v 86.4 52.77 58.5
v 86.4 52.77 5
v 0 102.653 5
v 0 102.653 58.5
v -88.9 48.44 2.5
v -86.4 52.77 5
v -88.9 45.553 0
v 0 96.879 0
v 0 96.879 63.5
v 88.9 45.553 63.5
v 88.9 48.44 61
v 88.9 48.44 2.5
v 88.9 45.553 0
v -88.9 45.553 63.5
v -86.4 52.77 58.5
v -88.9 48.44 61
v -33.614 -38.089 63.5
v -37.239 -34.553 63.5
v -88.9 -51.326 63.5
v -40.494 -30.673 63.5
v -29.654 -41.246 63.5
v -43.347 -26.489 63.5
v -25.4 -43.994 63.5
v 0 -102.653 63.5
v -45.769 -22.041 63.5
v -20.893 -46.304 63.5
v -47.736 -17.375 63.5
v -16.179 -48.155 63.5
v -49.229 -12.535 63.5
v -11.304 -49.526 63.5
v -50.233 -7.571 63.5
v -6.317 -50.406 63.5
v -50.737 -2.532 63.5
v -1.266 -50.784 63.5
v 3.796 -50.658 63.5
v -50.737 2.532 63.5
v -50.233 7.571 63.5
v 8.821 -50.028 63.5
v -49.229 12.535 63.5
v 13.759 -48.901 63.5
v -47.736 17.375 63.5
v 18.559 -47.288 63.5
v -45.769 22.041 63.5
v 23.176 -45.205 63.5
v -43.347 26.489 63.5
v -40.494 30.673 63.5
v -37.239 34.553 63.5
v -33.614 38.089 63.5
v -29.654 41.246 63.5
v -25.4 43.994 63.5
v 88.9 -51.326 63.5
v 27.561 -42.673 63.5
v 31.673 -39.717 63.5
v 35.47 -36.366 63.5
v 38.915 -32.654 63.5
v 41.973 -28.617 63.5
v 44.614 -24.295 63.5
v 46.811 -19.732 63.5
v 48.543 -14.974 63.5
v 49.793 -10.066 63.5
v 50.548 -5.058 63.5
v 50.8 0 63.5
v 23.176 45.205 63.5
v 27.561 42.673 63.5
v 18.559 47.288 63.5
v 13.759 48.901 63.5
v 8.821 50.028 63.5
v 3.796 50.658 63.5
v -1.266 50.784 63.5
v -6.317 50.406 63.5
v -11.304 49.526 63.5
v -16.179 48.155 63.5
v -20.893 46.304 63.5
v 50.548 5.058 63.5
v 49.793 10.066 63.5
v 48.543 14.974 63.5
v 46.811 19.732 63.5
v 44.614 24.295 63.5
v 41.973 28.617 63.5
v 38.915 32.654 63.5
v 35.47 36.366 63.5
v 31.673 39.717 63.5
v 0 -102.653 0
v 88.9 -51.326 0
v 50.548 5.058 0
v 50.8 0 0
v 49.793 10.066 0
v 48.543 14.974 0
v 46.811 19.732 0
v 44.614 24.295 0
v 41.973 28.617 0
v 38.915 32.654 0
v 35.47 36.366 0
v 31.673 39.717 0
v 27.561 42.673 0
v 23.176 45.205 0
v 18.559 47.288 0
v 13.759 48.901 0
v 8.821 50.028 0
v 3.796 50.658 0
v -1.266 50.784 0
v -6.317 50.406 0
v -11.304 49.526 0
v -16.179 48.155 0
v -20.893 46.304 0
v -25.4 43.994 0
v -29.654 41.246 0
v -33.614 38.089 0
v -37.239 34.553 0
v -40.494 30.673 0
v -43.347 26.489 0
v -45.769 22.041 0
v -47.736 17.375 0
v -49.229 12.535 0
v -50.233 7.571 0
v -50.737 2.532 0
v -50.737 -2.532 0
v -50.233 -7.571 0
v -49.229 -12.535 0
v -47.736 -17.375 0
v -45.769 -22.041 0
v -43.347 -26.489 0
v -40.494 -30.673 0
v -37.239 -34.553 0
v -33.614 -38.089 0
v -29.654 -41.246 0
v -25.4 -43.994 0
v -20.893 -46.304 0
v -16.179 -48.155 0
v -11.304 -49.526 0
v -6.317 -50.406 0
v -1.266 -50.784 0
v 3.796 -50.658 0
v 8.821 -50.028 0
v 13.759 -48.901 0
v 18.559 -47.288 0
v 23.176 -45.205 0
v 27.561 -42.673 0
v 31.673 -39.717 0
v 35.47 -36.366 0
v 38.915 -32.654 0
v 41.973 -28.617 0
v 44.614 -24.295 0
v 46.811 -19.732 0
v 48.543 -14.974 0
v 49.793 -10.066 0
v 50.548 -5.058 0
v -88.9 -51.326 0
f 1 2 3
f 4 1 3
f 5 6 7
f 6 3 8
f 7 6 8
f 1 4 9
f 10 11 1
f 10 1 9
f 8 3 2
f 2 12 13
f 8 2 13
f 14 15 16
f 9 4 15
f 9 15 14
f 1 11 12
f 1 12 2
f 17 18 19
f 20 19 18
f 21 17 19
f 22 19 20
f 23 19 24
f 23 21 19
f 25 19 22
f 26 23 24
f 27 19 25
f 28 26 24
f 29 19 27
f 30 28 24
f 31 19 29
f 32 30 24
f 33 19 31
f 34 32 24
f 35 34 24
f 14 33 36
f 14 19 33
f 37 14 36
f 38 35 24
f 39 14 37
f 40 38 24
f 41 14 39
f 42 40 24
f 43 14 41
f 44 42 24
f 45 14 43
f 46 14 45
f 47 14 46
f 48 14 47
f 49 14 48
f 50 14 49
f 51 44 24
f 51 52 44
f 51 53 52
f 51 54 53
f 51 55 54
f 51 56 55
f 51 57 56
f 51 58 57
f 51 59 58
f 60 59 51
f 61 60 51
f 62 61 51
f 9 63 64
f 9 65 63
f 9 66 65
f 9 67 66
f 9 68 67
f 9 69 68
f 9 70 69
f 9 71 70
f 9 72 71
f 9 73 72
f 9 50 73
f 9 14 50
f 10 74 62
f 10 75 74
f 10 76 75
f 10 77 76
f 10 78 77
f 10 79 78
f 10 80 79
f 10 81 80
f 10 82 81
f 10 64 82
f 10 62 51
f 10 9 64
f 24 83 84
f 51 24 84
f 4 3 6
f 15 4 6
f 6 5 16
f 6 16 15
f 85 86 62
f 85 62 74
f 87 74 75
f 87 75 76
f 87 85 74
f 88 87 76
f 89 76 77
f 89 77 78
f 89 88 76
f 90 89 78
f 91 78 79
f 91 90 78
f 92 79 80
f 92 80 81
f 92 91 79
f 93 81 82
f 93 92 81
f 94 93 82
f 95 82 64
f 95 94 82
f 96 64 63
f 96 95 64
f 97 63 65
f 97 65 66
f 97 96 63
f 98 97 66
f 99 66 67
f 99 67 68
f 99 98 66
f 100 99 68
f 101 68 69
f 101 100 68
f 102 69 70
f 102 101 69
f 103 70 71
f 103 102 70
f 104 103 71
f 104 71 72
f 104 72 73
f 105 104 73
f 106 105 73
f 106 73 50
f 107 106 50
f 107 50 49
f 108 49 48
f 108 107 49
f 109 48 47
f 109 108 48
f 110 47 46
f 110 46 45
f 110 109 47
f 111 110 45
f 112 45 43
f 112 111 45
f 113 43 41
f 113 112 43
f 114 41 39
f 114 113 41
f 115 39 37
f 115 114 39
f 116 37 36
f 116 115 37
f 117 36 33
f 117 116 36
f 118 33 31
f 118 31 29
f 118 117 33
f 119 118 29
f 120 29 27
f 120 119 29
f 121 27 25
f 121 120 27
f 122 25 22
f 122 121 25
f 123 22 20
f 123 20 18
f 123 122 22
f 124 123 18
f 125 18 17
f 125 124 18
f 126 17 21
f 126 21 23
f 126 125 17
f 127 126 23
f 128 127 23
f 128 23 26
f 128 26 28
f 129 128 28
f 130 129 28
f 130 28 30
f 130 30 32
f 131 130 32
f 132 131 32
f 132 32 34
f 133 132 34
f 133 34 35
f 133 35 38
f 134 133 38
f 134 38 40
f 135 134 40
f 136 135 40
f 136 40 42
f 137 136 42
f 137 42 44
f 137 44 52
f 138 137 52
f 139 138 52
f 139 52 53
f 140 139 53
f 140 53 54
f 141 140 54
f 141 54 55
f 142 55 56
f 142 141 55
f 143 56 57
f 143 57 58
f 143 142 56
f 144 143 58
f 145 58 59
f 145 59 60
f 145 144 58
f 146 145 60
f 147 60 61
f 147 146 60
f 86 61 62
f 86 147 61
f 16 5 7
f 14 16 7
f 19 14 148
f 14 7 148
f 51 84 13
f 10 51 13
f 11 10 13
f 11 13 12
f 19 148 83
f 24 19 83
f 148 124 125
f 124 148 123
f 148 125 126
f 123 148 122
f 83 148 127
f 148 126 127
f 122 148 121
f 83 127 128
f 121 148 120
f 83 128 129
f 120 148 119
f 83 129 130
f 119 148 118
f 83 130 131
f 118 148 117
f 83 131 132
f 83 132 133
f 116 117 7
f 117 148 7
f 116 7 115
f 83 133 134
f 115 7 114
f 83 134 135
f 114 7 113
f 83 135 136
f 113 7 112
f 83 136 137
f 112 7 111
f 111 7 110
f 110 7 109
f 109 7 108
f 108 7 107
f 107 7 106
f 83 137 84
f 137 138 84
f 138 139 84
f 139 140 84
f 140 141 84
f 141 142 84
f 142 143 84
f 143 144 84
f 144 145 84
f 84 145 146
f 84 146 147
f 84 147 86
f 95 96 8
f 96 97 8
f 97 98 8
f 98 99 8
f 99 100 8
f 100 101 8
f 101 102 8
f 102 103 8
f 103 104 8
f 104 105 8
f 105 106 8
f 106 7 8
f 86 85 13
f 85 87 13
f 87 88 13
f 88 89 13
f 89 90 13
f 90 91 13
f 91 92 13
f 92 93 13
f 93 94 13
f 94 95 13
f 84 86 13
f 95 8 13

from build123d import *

# Parameters (mm, degrees)
F0_R        = 50.8
F1_DEPTH    = 63.5
F2_T1_DEPTH = 128.3697077416
F2_T3_DEPTH = 128.3697077416
F2_T5_DEPTH = 78.8079500043


# Not quite as in the source:
# - a fillet or chamfer that OpenCascade refuses, or shapes differently, is made with other operations: its cross-section is extruded or revolved along the edge and cut away or added


with BuildPart() as f1:
    # F0 (on Top) → F1 (new body)
    with BuildSketch(Plane.XY):
        Polygon((-88.9, -51.326438931), (0, -102.6528778619), (88.9, -51.326438931), (88.9, 51.326438931), (0, 102.6528778619), (-88.9, 51.326438931), align=None)
        Circle(F0_R, mode=Mode.SUBTRACT)
    extrude(amount=F1_DEPTH)

    # F2: chamfer of 5 on 6 edges, made by hand

    # F2_s2 → F2_t1 (cut)
    with BuildSketch(Plane(origin=(55.5857139903, -32.0924269354, 0), x_dir=(0, 0, 1), z_dir=(-0.8660254038, 0.5, 0))):
        Polygon((58.5, 88.9), (63.5, 83.9), (63.5, 88.9), align=None)
        Polygon((5, 88.9), (0, 83.9), (0, 88.9), align=None)
    extrude(amount=F2_T1_DEPTH, mode=Mode.SUBTRACT)

    # F2_s4 → F2_t3 (cut)
    with BuildSketch(Plane(origin=(55.5857139903, 32.0924269354, 0), x_dir=(0, 0, 1), z_dir=(-0.8660254038, -0.5, 0))):
        Polygon((58.5, 88.9), (63.5, 83.9), (63.5, 88.9), align=None)
        Polygon((5, 88.9), (0, 83.9), (0, 88.9), align=None)
    extrude(amount=F2_T3_DEPTH, mode=Mode.SUBTRACT)

    # F2_s6 → F2_t5 (cut)
    with BuildSketch(Plane.XY.offset(-7.6539750021)):
        Polygon((-88.9, 48.439687585), (-86.4, 52.7698146039), (-88.9, 51.326438931), align=None)
        Polygon((88.9, 48.439687585), (86.4, 52.7698146039), (88.9, 51.326438931), align=None)
    extrude(amount=F2_T5_DEPTH, mode=Mode.SUBTRACT)


solid = f1.part
